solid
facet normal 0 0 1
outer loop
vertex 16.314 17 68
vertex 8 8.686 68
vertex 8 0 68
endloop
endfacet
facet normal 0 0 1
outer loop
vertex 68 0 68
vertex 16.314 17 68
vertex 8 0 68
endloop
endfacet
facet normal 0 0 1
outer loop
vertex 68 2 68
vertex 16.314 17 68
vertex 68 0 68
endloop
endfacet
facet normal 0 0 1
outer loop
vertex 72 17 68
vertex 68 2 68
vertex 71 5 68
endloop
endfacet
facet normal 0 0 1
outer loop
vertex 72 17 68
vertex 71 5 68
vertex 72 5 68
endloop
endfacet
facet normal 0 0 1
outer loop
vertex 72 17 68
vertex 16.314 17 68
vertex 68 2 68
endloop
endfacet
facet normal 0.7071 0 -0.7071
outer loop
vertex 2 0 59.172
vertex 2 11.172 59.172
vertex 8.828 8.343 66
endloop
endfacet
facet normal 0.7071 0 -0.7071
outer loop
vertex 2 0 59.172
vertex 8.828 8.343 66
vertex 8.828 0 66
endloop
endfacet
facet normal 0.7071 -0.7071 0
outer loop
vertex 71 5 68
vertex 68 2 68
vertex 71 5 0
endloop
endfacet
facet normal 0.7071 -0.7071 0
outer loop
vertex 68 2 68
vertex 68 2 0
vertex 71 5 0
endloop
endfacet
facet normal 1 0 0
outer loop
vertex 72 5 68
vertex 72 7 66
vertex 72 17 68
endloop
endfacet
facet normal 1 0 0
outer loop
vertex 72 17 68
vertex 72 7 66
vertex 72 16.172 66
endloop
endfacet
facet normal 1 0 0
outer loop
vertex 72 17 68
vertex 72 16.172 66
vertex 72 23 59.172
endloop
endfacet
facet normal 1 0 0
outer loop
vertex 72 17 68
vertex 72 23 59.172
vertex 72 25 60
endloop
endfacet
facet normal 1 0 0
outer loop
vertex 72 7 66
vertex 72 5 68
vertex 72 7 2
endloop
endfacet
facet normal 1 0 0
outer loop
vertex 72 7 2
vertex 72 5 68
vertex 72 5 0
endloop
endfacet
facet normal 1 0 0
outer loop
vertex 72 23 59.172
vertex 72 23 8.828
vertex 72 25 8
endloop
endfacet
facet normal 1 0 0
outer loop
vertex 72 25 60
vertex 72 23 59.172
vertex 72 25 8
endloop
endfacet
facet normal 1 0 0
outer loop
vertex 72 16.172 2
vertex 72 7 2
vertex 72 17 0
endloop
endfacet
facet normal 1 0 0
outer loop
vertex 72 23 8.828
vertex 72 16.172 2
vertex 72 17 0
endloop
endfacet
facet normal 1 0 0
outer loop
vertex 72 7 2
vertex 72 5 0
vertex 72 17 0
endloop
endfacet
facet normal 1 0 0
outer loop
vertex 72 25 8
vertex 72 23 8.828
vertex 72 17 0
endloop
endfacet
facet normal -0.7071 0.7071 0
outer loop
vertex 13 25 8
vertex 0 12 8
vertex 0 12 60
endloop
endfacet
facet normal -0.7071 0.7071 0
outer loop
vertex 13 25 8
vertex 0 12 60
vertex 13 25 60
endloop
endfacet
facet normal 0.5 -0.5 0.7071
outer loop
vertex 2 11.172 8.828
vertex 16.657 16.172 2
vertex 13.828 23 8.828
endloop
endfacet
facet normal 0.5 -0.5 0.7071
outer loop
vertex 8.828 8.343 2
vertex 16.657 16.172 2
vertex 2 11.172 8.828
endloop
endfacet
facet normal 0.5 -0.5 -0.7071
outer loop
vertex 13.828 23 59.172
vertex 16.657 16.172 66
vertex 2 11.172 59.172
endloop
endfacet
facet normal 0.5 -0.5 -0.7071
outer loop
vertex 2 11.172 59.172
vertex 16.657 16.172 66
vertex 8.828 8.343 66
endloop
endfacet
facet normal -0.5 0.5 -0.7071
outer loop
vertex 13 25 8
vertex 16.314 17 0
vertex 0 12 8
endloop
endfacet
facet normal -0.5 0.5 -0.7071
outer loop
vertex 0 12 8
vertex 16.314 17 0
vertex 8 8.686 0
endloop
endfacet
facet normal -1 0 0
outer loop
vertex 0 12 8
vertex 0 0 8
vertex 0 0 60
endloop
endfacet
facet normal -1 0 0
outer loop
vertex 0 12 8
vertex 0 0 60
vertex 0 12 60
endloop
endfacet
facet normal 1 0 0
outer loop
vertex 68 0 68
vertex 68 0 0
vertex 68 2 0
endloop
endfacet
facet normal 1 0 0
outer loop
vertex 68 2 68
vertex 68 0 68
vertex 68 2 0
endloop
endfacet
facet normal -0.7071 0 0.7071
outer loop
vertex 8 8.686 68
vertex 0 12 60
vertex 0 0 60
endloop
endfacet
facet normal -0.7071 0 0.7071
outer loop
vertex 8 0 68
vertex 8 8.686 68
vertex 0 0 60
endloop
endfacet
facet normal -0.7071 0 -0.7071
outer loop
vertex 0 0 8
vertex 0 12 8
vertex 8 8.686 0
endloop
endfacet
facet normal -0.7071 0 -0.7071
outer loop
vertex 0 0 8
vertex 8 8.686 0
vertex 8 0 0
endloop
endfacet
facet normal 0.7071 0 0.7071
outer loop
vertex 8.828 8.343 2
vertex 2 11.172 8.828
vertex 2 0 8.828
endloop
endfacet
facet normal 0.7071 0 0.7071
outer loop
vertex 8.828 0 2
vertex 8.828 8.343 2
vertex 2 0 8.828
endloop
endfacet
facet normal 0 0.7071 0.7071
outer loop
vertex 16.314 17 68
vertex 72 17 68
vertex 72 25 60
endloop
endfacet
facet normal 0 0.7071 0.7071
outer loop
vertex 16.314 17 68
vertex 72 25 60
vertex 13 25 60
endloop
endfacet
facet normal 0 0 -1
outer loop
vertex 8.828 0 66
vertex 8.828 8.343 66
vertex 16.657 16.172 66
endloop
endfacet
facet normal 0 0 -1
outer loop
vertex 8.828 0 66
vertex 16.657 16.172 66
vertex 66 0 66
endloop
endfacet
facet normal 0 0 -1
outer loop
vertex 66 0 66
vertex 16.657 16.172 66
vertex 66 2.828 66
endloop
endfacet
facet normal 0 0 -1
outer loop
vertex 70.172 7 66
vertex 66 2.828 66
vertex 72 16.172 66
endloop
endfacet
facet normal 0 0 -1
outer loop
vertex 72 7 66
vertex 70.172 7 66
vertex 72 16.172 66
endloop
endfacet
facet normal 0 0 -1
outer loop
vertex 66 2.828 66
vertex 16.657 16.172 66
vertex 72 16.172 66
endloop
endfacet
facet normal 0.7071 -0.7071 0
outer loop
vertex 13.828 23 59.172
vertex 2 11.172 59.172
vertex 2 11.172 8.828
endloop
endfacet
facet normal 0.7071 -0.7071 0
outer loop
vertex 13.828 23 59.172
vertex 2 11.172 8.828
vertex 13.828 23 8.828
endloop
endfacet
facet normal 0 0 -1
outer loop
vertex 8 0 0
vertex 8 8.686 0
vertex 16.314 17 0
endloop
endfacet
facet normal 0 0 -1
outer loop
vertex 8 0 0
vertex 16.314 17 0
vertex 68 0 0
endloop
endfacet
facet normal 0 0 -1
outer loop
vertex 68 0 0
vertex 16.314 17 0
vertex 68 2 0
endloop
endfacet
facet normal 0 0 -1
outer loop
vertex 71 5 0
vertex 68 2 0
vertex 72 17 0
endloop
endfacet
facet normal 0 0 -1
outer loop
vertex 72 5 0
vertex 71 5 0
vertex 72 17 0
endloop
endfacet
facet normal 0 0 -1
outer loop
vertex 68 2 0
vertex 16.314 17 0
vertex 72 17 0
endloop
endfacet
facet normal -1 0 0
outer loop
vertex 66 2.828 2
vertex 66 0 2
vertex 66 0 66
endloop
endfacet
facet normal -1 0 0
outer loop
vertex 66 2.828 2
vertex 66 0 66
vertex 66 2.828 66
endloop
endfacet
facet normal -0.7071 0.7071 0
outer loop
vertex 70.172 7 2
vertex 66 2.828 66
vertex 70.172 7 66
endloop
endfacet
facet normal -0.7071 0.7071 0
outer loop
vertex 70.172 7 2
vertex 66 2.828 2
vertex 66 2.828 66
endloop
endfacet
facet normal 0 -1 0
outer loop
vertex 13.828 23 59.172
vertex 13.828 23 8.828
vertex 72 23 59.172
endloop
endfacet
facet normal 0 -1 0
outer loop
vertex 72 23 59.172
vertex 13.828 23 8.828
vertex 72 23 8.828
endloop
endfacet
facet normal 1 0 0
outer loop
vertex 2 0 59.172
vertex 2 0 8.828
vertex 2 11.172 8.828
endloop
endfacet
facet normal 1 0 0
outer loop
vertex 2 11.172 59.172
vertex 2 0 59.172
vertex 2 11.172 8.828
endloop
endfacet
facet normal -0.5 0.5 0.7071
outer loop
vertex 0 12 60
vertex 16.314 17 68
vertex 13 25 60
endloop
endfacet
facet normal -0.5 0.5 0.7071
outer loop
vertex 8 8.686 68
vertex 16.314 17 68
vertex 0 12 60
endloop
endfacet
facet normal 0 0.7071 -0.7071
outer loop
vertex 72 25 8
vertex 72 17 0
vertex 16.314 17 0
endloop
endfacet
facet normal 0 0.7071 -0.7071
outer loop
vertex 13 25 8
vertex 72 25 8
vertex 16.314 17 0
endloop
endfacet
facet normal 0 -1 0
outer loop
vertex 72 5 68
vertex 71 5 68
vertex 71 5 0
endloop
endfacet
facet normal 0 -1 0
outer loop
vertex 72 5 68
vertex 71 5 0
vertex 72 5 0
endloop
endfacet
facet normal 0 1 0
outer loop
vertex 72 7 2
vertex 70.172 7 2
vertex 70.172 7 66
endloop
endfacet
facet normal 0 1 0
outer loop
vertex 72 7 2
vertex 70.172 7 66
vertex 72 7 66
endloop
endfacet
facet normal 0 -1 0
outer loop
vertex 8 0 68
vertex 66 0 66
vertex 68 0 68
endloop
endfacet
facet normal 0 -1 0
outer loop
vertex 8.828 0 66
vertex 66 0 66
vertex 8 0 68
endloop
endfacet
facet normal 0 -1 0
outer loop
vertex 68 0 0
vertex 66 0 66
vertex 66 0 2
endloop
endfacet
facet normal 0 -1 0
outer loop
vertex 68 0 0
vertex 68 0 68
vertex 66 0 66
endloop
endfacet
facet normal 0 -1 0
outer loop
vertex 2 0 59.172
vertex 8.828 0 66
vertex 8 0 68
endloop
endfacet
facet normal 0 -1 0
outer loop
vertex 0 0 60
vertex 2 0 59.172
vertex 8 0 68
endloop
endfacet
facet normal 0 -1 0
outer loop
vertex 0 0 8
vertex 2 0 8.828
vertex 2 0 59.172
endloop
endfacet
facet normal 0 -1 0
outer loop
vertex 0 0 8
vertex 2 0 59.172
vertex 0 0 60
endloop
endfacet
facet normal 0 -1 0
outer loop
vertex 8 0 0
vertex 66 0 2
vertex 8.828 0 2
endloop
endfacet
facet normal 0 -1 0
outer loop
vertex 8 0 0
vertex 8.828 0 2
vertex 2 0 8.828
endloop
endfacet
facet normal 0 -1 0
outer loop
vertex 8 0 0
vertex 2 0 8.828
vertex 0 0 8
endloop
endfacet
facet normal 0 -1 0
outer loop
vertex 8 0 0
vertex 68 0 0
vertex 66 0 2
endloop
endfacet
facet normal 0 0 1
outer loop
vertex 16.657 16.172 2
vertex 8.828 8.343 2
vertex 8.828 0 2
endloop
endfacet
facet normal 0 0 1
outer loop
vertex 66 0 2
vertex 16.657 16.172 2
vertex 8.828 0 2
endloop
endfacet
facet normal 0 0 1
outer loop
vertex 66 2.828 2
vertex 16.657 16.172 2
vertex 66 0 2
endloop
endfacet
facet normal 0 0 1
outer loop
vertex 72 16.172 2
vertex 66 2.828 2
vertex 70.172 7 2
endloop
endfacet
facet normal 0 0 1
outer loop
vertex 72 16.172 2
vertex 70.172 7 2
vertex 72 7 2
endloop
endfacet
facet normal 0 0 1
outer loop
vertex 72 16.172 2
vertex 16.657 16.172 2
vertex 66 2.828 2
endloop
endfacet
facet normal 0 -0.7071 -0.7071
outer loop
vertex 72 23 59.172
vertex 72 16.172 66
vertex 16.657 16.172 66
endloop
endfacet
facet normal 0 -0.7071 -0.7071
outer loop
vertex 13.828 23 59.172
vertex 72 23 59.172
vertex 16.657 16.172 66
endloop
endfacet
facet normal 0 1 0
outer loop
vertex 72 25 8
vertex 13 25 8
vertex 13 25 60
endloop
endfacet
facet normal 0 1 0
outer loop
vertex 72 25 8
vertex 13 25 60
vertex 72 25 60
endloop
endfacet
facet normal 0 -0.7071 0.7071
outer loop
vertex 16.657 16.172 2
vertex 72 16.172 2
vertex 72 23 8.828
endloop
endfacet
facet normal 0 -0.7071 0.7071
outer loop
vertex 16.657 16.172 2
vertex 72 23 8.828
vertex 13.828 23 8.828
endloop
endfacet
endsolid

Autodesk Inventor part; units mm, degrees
ref_plane "YZ Plane" through (0, 0, 0) normal (1, 0, 0) x (0, 1, 0)
ref_plane "XZ Plane" through (0, 0, 0) normal (0, 1, 0) x (-1, 0, 0)
ref_plane "XY Plane" through (0, 0, 0) normal (0, 0, 1) x (1, 0, 0)
sketch "Sketch1" plane through (0, 0, 0) normal (0, 0, 1) x (1, 0, 0)
  line L0 (0, 0) -> (0, 12)
  line L1 (0, 12) -> (13, 25)
  line L2 (13, 25) -> (72, 25)
  line L3 (68, 0) -> (68, 2)
  line L4 (68, 2) -> (71, 5)
  line L5 (71, 5) -> (72, 5)
  line L6 (72, 5) -> (72, 25)
  line L7 (68, 0) -> (0, 0)
  point P0 (34, 0)
  dimension "d1" = 45
  dimension "d2" = 25
  dimension "d3" = 68
  dimension "d4" = 5
  dimension "d5" = 2
  dimension "d6" = 12
  dimension "d7" = 38
extrude "Extrusion1" add sketch "Sketch1" along normal blind 68
chamfer "Chamfer1" distance 8 angle 45 6 edges at (0, 6, 68) (6.5, 18.5, 68) (42.5, 25, 68) (0, 6, 0) (6.5, 18.5, 0) (42.5, 25, 0)
shell "Shell1" thickness 2 removed faces 2 at (48, 0, 45.3333) at (72, 11.6667, 25.3333)
properties part number "power_supply_fan_chamber" material "ABS Plastic"
